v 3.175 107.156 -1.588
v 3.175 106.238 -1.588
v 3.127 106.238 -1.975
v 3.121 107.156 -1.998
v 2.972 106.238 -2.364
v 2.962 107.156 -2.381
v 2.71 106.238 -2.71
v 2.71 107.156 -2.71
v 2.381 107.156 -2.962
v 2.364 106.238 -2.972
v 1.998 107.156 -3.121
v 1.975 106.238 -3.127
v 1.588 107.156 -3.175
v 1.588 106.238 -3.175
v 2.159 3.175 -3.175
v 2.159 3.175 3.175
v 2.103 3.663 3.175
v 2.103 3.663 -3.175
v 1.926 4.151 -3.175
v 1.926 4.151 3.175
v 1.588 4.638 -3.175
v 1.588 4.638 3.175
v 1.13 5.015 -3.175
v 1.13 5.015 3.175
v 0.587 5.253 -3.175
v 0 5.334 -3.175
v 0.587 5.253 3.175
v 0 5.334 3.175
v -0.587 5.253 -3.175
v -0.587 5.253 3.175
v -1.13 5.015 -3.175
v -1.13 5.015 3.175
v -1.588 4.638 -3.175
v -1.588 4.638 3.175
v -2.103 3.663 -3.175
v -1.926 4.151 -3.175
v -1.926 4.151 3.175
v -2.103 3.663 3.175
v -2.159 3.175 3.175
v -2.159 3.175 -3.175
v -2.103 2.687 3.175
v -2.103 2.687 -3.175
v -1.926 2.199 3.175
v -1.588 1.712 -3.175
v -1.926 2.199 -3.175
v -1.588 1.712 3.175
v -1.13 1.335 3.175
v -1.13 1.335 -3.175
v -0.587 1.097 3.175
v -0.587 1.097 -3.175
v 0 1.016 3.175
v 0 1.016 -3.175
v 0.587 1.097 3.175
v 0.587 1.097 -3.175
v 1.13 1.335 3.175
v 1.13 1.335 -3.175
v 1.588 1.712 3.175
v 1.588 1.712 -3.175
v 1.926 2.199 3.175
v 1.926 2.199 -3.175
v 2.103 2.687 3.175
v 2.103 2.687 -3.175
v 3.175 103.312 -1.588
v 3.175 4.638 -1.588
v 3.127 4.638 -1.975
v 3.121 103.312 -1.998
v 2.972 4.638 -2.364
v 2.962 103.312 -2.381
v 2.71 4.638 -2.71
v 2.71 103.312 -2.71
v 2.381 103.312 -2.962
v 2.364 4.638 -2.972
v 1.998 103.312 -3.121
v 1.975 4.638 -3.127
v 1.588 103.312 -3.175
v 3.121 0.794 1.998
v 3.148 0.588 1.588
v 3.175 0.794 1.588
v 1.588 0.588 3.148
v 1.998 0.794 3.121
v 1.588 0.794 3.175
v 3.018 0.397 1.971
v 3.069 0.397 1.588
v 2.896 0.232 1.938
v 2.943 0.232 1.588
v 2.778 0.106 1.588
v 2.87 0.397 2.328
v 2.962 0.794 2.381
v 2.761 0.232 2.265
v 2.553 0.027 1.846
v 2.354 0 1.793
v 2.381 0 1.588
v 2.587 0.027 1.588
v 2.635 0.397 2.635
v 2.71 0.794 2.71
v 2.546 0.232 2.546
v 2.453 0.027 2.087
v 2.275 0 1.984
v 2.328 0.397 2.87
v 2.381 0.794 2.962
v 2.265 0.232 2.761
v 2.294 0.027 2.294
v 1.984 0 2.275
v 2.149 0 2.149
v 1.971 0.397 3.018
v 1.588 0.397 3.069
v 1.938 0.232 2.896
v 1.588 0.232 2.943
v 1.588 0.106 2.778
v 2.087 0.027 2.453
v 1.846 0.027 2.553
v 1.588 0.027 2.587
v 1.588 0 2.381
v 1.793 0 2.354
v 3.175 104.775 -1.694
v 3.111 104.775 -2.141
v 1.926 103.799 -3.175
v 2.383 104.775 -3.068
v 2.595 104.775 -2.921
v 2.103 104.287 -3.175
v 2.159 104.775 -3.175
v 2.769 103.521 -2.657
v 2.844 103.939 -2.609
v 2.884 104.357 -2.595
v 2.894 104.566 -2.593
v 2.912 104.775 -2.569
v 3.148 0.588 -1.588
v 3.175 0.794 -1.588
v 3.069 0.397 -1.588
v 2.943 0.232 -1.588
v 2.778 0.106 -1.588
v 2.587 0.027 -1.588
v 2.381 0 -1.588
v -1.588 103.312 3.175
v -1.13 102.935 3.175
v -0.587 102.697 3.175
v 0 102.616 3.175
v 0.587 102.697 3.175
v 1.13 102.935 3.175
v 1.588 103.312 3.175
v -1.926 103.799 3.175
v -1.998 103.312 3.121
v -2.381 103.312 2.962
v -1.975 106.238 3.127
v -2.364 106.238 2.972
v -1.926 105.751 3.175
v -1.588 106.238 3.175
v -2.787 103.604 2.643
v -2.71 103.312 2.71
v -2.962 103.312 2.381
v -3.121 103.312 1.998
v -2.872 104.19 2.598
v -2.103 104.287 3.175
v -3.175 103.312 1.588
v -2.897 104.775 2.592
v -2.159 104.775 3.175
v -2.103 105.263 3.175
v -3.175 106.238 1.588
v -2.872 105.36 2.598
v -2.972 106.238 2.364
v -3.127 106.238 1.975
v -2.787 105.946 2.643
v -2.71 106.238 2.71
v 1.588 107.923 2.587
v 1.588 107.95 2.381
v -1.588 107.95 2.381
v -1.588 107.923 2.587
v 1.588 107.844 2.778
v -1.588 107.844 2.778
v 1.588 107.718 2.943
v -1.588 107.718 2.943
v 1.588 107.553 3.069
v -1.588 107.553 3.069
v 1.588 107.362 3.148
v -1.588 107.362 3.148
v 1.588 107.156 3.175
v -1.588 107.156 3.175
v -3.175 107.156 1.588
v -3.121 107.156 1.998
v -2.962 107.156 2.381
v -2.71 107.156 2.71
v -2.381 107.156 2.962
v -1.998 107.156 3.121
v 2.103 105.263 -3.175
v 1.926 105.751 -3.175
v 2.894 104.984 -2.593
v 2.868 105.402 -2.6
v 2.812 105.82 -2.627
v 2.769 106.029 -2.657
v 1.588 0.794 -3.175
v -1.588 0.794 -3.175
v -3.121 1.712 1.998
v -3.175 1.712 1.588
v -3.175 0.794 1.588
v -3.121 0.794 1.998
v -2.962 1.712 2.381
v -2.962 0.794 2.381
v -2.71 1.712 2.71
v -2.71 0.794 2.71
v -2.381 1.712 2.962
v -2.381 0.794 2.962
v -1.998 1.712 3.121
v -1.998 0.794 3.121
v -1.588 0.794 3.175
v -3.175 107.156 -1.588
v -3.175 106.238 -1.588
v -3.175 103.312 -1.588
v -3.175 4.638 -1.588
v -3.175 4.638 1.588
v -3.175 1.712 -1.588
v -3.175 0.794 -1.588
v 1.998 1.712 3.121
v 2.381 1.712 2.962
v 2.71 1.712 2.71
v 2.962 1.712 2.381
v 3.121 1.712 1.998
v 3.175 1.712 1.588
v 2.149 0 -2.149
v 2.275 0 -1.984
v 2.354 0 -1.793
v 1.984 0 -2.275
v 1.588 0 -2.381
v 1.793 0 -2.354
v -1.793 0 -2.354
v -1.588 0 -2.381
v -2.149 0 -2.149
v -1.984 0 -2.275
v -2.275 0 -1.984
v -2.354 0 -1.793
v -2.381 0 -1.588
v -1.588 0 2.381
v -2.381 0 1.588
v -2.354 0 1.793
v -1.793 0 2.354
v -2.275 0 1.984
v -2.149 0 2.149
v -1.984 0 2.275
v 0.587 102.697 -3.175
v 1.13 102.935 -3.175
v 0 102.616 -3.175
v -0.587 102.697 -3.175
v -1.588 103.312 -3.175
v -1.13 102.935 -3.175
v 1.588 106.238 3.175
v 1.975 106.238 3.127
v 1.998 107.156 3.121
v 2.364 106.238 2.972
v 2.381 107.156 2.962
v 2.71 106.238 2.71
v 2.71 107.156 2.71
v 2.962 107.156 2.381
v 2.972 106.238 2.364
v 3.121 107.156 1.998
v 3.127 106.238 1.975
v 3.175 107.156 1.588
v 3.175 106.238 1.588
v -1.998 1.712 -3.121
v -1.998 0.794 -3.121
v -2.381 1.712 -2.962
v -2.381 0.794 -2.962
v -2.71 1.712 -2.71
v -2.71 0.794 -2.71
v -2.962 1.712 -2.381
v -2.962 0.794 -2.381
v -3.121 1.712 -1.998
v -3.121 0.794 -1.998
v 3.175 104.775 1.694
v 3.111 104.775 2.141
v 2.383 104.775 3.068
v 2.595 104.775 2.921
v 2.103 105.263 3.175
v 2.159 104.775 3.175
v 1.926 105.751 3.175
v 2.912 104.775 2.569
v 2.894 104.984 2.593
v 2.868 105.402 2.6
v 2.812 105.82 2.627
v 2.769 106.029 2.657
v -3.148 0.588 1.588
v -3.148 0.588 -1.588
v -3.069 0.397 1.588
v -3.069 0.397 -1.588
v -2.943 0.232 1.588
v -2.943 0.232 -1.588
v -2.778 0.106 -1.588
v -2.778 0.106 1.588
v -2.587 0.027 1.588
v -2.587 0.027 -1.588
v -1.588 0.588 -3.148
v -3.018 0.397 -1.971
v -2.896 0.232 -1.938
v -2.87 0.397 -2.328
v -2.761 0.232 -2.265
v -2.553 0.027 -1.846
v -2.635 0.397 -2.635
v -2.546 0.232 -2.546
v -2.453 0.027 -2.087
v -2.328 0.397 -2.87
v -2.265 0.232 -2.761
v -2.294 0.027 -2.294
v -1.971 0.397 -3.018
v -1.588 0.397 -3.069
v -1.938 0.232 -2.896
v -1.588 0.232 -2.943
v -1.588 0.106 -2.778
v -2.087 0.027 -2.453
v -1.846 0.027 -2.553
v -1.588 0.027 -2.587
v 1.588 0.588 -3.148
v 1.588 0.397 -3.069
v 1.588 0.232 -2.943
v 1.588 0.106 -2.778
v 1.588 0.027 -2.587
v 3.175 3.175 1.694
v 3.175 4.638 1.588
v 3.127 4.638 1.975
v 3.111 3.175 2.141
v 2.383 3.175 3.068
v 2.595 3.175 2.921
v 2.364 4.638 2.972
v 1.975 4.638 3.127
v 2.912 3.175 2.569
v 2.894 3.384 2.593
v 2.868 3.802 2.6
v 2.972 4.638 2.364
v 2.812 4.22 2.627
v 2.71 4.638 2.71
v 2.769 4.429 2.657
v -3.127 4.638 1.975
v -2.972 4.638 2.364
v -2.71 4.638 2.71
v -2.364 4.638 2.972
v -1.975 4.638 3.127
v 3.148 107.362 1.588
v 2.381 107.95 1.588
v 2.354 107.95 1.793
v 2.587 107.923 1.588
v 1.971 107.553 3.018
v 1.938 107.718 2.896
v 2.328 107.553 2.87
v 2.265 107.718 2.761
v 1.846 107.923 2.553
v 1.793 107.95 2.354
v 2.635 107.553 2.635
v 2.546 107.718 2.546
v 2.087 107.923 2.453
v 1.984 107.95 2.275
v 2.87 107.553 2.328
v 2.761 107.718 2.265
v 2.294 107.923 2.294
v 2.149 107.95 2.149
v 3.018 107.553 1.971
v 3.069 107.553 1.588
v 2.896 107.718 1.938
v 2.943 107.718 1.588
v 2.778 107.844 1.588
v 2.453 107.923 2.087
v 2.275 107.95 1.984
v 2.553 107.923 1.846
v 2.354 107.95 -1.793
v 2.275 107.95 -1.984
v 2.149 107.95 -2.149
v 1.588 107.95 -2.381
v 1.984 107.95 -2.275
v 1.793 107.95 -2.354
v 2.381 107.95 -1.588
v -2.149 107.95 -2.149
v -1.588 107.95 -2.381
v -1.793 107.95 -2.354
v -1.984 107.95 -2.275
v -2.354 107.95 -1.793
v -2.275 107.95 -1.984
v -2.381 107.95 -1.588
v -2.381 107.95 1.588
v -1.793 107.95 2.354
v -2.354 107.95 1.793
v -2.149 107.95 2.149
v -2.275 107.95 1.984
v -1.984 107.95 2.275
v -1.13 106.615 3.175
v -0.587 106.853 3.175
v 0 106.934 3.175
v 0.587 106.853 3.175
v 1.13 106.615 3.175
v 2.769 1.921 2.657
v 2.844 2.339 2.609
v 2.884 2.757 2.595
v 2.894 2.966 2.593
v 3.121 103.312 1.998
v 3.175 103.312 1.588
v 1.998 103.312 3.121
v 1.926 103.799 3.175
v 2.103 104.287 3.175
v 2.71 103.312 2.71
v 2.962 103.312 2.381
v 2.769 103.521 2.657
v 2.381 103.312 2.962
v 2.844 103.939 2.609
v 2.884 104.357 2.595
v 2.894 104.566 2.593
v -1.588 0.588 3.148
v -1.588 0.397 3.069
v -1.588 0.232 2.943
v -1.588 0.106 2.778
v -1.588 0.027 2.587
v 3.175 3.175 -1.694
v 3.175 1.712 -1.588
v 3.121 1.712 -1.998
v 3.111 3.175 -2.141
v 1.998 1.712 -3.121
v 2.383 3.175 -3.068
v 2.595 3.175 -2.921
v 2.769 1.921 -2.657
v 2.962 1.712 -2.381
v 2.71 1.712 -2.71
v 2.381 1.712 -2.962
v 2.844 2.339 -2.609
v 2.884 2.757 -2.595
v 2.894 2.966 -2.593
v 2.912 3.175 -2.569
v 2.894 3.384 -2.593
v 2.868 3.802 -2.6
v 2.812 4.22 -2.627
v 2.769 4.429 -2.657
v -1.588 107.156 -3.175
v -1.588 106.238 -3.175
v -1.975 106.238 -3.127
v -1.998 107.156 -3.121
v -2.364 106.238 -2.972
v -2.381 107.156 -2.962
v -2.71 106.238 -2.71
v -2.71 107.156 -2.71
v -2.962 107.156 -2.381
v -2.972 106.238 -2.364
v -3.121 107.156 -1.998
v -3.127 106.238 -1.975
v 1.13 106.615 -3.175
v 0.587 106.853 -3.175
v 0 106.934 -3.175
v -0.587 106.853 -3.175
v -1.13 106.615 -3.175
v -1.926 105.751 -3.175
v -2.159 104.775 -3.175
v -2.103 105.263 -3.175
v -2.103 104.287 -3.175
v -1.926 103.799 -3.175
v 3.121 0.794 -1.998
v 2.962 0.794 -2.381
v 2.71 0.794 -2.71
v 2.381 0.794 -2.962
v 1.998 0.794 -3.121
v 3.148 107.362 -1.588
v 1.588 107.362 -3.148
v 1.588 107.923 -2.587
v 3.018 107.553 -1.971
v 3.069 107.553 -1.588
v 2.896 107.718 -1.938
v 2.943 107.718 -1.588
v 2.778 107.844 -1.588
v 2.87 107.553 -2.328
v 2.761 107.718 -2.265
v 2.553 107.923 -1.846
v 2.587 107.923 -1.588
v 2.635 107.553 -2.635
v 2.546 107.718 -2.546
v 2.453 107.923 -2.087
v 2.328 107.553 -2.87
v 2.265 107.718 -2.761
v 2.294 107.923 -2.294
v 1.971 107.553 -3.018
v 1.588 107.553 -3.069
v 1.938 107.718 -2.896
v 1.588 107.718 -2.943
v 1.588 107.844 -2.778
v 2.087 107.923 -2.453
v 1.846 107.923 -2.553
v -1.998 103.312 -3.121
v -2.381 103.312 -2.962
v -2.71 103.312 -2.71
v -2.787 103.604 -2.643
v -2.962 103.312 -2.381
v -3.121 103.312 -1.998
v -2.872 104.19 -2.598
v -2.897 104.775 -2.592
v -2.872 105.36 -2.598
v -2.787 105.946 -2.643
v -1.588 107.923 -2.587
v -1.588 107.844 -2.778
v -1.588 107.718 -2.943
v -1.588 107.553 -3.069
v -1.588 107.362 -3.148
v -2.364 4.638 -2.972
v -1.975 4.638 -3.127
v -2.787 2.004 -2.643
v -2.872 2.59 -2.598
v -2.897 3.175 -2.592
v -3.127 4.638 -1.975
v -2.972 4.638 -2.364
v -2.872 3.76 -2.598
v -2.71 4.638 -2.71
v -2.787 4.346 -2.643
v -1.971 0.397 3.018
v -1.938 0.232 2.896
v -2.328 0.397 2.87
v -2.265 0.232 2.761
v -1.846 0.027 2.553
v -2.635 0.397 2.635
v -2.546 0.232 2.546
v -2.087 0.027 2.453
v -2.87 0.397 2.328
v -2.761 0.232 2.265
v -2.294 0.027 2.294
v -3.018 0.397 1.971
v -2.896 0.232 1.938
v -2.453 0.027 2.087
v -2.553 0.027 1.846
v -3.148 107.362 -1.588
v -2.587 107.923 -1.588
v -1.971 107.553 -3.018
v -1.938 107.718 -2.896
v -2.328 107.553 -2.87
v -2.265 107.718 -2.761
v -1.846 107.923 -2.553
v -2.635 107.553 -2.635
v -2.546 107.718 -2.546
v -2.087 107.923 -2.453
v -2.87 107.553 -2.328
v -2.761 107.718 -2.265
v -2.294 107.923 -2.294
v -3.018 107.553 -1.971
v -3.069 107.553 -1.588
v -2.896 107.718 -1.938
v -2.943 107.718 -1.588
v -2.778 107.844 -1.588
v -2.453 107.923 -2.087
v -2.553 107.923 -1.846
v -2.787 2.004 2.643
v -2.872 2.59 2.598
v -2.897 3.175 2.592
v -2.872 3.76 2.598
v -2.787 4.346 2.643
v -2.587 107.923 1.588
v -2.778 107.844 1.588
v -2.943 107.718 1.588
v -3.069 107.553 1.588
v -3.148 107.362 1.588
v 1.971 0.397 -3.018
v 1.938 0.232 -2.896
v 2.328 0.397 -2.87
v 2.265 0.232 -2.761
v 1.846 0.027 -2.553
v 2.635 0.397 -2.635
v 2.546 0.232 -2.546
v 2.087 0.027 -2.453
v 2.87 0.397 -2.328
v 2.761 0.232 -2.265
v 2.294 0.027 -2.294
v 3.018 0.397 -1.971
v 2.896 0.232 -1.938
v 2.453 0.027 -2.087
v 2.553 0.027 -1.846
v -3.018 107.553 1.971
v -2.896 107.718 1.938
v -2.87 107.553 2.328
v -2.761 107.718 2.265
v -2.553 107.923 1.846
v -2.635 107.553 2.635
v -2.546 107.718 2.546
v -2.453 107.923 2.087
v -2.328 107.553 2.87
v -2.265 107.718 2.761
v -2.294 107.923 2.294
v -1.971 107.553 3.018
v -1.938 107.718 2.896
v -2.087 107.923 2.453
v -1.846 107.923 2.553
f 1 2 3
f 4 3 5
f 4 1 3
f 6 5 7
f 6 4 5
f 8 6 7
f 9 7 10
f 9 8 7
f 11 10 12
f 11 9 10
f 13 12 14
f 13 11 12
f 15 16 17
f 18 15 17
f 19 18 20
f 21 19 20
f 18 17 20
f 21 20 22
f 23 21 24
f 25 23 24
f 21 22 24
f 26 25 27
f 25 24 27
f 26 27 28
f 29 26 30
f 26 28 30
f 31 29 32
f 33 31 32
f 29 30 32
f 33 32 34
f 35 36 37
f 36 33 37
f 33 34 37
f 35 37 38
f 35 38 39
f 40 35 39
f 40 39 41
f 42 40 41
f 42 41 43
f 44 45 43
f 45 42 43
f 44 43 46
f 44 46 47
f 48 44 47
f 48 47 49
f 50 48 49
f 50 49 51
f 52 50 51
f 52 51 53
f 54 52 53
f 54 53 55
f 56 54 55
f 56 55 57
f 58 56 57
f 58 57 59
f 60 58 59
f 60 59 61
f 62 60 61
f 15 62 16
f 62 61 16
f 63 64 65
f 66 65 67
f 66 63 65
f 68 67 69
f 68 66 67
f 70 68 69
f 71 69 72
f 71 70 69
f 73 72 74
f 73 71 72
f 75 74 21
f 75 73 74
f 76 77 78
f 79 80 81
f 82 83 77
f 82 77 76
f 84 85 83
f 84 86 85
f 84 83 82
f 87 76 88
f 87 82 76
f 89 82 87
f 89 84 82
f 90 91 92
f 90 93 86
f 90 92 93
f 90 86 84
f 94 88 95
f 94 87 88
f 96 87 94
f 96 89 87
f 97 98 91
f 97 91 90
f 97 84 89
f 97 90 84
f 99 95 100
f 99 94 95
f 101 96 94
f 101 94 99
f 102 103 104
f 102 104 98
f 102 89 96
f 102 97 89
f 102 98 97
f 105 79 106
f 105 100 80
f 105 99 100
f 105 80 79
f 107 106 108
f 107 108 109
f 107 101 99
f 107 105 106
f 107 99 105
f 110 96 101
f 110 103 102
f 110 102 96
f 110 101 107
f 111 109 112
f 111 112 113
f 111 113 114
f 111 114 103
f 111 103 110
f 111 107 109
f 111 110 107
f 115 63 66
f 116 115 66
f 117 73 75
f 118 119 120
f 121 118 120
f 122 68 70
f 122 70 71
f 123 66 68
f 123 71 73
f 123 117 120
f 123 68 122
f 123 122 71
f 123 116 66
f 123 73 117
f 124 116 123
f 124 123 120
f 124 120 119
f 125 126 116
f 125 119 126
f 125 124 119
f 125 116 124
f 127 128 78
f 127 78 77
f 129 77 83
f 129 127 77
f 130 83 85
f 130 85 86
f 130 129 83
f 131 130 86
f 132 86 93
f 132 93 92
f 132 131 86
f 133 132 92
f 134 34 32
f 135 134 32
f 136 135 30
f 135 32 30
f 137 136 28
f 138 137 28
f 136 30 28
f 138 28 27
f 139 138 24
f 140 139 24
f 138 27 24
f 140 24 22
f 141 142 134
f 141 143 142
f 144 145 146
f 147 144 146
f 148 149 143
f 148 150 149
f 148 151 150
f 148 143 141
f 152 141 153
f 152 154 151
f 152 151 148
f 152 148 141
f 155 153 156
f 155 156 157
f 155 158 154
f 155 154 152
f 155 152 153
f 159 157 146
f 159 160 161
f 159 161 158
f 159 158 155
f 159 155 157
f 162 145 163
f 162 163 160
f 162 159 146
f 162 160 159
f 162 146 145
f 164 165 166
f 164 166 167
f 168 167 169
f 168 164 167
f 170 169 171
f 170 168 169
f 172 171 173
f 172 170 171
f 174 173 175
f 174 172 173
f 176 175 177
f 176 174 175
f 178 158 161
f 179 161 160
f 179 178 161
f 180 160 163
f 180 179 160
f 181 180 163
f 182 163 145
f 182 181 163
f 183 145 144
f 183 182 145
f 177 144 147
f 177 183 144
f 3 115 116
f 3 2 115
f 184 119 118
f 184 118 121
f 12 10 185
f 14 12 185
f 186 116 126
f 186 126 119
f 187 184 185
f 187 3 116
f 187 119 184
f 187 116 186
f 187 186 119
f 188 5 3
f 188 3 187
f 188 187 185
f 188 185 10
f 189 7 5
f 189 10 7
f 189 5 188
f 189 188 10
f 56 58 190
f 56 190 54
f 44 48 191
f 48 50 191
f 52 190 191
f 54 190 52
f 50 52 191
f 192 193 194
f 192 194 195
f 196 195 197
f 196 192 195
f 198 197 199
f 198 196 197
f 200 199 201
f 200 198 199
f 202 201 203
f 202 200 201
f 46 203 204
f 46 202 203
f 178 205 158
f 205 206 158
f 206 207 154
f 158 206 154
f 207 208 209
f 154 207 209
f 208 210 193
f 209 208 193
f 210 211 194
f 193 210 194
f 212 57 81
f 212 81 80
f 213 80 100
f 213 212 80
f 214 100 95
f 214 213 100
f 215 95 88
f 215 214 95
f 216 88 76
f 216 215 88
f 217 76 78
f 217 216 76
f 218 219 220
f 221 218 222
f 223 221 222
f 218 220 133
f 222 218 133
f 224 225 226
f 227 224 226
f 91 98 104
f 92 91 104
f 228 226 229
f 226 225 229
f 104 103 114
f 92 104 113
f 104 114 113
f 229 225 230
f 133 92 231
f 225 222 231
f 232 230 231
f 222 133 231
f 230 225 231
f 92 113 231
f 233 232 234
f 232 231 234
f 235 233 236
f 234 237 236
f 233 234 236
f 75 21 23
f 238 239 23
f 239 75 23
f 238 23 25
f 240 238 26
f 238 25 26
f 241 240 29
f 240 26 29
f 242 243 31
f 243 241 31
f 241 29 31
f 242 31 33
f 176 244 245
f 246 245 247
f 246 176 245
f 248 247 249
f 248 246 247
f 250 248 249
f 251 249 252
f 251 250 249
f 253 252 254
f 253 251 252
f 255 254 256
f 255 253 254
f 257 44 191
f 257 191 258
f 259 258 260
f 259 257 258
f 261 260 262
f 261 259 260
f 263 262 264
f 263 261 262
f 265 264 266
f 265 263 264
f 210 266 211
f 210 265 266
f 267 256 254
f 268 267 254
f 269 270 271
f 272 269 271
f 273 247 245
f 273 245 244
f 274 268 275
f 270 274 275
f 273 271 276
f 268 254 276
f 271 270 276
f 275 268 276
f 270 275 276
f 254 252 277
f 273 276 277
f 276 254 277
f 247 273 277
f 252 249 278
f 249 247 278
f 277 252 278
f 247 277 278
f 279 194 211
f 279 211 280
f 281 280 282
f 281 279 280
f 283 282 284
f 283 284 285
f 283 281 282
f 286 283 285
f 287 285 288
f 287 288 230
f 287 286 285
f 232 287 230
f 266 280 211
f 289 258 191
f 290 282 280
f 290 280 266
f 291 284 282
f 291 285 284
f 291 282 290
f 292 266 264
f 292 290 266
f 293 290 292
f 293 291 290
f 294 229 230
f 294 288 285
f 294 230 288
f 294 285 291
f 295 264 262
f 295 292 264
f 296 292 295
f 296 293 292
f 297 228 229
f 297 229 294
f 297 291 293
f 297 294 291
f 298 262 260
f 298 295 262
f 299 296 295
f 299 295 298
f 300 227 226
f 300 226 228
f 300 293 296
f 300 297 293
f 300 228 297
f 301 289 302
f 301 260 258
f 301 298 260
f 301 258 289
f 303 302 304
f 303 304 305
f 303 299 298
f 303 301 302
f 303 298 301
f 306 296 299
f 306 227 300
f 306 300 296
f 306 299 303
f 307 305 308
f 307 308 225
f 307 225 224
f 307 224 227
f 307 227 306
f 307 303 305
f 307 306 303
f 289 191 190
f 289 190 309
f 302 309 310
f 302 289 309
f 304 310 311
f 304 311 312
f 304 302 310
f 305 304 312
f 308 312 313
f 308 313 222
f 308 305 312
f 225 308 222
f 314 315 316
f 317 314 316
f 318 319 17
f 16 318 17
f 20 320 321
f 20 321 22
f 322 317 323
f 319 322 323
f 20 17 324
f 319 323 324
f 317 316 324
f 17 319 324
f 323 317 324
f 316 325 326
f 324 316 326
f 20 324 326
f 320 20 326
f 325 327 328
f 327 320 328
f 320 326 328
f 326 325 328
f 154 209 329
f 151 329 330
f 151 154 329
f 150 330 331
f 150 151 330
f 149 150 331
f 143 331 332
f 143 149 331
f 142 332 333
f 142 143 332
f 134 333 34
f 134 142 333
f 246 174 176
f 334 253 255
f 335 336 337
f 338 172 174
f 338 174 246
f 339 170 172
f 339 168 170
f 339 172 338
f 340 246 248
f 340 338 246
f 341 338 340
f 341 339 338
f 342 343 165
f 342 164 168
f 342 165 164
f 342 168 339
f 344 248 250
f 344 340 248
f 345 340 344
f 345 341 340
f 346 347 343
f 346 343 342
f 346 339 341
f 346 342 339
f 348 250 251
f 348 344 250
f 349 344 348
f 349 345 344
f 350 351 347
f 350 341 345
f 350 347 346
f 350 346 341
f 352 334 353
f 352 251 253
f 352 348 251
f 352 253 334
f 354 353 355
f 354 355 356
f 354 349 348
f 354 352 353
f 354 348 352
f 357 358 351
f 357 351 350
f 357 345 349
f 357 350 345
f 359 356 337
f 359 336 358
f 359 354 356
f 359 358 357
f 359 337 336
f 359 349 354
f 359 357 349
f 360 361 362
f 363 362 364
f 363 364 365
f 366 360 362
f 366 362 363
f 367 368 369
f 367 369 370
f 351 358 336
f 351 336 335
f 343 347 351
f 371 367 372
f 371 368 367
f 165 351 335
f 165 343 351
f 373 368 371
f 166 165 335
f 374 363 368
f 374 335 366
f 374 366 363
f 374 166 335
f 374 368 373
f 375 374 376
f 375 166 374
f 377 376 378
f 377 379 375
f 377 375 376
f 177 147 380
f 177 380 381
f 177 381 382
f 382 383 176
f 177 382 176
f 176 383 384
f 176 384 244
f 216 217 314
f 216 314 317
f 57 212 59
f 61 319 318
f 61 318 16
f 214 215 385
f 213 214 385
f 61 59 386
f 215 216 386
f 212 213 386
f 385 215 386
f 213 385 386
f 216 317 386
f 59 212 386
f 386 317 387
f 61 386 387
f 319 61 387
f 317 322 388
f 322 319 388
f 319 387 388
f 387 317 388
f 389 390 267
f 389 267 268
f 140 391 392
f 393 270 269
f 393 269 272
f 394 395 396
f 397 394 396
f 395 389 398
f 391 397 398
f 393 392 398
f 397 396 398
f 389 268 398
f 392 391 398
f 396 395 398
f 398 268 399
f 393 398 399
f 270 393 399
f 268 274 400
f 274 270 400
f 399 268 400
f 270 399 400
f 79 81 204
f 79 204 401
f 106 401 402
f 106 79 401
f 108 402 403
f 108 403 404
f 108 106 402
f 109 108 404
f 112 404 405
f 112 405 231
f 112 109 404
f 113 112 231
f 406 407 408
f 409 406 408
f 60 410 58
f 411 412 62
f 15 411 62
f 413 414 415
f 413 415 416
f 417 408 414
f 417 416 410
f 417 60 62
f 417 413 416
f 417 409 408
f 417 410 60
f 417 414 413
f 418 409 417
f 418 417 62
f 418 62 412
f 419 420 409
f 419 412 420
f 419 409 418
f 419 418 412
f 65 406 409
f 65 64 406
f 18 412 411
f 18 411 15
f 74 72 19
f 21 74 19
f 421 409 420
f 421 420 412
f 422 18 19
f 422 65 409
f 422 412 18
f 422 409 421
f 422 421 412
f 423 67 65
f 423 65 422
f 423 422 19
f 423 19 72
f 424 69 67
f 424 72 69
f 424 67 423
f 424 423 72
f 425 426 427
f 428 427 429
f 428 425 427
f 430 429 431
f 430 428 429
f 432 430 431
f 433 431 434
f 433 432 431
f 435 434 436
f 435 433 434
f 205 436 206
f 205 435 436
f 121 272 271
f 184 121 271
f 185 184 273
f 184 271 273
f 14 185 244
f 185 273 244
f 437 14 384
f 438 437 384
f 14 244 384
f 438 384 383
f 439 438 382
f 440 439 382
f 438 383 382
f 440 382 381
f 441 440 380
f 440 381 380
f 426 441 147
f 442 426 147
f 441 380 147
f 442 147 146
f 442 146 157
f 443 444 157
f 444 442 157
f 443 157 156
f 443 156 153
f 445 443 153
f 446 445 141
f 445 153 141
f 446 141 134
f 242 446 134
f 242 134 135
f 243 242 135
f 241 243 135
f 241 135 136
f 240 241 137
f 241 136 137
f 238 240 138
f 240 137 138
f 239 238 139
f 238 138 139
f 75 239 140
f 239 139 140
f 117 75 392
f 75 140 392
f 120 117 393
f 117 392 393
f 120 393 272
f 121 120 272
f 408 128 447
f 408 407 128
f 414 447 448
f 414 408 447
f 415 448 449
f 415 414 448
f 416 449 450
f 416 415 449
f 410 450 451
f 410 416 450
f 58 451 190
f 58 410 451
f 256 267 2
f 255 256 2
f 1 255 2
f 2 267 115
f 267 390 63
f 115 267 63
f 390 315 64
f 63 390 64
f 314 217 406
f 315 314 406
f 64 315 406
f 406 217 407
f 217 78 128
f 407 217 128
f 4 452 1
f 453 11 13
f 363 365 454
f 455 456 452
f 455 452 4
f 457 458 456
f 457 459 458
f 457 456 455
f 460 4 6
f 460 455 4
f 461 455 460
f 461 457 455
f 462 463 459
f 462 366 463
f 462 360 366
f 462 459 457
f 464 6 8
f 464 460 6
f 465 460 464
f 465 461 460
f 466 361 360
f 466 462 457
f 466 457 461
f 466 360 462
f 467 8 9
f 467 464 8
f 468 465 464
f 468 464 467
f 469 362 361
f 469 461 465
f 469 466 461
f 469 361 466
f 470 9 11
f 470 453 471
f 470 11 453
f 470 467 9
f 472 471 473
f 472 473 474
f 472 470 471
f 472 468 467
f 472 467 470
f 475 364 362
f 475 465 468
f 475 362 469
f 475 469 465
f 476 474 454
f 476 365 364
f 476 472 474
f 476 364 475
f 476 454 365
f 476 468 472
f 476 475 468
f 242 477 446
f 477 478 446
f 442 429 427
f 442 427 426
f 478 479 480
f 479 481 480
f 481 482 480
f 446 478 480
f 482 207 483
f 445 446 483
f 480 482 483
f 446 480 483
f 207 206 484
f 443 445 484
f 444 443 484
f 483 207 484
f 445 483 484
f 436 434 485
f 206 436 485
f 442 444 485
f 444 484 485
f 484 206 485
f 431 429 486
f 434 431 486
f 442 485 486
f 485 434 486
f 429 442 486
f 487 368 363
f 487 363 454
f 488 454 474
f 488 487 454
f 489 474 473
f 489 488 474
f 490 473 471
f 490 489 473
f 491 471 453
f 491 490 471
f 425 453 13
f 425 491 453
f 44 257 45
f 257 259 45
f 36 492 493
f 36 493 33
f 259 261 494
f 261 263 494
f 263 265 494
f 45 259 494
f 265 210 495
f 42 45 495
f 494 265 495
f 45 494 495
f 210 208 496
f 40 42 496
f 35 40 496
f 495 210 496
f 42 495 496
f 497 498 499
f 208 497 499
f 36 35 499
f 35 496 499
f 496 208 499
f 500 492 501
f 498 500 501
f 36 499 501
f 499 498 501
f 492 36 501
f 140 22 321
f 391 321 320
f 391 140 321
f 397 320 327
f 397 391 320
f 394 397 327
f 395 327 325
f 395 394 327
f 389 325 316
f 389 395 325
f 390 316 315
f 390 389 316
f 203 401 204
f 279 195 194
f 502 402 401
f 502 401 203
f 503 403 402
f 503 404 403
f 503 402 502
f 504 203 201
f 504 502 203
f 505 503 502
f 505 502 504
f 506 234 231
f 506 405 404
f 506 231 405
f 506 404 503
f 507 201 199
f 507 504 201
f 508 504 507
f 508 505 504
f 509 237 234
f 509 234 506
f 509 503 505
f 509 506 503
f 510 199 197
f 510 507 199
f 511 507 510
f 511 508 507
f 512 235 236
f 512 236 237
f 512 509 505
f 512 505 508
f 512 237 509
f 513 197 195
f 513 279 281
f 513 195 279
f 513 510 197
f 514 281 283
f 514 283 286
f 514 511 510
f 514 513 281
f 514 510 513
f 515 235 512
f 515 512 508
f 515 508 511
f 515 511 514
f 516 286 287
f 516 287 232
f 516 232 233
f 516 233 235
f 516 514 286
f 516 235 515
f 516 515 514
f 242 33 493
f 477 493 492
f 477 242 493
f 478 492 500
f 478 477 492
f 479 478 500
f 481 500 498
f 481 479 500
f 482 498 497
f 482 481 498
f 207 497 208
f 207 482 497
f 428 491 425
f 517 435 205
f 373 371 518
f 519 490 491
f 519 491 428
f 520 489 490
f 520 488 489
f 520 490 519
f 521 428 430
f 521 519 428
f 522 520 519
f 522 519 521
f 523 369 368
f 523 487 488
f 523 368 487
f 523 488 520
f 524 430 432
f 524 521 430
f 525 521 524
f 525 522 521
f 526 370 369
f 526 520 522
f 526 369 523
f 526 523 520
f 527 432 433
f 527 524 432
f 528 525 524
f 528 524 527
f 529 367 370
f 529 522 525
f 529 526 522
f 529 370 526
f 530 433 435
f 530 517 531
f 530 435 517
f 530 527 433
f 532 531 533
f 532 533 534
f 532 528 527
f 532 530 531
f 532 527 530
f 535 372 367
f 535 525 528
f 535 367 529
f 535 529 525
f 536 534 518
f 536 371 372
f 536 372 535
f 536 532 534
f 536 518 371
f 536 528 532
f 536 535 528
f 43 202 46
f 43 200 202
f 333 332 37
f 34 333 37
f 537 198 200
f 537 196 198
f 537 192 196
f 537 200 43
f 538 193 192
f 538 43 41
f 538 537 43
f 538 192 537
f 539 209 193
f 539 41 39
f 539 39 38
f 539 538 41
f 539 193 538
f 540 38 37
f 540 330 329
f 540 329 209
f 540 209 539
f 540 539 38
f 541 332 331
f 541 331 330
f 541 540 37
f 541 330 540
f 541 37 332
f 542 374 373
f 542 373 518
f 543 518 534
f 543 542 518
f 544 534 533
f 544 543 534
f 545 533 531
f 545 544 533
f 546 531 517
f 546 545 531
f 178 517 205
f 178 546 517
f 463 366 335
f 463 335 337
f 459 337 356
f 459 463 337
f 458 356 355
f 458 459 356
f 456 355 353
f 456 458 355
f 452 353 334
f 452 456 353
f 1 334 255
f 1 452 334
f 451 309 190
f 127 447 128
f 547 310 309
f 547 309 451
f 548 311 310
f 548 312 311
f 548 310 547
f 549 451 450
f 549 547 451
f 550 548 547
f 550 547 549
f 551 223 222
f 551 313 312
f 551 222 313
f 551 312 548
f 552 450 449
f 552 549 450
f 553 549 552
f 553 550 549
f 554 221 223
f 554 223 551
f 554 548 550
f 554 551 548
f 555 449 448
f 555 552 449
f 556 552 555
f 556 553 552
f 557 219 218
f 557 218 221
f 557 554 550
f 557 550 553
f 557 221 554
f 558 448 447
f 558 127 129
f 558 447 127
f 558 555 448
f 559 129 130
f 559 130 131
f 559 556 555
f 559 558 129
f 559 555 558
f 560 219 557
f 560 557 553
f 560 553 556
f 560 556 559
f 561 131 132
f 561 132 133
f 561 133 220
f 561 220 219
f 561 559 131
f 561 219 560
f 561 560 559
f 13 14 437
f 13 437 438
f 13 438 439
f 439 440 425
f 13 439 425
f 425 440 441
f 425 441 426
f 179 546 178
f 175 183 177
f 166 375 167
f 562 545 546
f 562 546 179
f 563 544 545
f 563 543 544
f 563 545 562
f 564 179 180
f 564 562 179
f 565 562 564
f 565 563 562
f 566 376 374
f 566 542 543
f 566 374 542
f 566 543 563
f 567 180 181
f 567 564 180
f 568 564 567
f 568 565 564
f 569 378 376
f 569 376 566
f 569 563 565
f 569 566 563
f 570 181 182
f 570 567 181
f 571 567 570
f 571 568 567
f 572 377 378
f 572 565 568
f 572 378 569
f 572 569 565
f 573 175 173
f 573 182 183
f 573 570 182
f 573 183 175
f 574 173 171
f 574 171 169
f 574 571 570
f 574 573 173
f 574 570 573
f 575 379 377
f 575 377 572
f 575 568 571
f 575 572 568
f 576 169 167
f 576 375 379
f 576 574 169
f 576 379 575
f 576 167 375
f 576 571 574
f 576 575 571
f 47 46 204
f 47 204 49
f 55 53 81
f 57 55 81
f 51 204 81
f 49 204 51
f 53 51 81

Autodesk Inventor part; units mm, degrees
ref_plane "YZ Plane" through (0, 0, 0) normal (1, 0, 0) x (0, 1, 0)
ref_plane "XZ Plane" through (0, 0, 0) normal (0, 1, 0) x (-1, 0, 0)
ref_plane "XY Plane" through (0, 0, 0) normal (0, 0, 1) x (1, 0, 0)
sketch "Sketch1" plane through (0, 0, 0) normal (0, 1, 0) x (-1, 0, 0)
  line L0 (-3.175, -3.175) -> (3.175, -3.175)
  line L1 (3.175, -3.175) -> (3.175, 3.175)
  line L2 (3.175, 3.175) -> (-3.175, 3.175)
  line L3 (-3.175, 3.175) -> (-3.175, -3.175)
  line L4 (-3.175, -3.175) -> (3.175, 3.175) construction
  line L5 (3.175, -3.175) -> (-3.175, 3.175) construction
  point P0 (0, 0)
  dimension "d0" = 6.35
  dimension "d1" = 6.35
extrude "Extrusion1" add sketch "Sketch1" along normal blind 107.95
sketch "Sketch2" plane through (-3.175, 0, 3.175) normal (0, 0, 1) x (1, 0, 0)
  circle A0 centre (3.175, 3.175) radius 2.159
  line L0 (0, 0) -> (6.35, 0) projected
  circle A1 centre (3.175, 104.775) radius 2.159
  line L1 (0, 107.95) -> (6.35, 107.95) projected
  point P0 (3.175, 0)
  dimension "d4" = 4.318
  dimension "d5" = 3.175
  dimension "d6" = 4.318
  dimension "d7" = 3.175
extrude "Extrusion2" cut sketch "Sketch2" against normal blind 101.6
fillet "Fillet1" radius 1.5875 4 edges at (3.175, 53.975, -3.175) (3.175, 53.975, 3.175) (-3.175, 53.975, -3.175) (-3.175, 53.975, 3.175)
fillet "Fillet2" radius 0.7937 16 edges at (2.71, 107.95, -2.71) (0, 107.95, -3.175) (-2.71, 107.95, -2.71) (-3.175, 107.95, 0) (-2.71, 107.95, 2.71) (0, 107.95, 3.175) (2.71, 107.95, 2.71) (3.175, 107.95, 0) (3.175, 0, 0) (2.71, 0, -2.71) (0, 0, -3.175) (-2.71, 0, -2.71) (-3.175, 0, 0) (-2.71, 0, 2.71) (0, 0, 3.175) (2.71, 0, 2.71)
properties part number "30 stop" material "Stainless Steel"
